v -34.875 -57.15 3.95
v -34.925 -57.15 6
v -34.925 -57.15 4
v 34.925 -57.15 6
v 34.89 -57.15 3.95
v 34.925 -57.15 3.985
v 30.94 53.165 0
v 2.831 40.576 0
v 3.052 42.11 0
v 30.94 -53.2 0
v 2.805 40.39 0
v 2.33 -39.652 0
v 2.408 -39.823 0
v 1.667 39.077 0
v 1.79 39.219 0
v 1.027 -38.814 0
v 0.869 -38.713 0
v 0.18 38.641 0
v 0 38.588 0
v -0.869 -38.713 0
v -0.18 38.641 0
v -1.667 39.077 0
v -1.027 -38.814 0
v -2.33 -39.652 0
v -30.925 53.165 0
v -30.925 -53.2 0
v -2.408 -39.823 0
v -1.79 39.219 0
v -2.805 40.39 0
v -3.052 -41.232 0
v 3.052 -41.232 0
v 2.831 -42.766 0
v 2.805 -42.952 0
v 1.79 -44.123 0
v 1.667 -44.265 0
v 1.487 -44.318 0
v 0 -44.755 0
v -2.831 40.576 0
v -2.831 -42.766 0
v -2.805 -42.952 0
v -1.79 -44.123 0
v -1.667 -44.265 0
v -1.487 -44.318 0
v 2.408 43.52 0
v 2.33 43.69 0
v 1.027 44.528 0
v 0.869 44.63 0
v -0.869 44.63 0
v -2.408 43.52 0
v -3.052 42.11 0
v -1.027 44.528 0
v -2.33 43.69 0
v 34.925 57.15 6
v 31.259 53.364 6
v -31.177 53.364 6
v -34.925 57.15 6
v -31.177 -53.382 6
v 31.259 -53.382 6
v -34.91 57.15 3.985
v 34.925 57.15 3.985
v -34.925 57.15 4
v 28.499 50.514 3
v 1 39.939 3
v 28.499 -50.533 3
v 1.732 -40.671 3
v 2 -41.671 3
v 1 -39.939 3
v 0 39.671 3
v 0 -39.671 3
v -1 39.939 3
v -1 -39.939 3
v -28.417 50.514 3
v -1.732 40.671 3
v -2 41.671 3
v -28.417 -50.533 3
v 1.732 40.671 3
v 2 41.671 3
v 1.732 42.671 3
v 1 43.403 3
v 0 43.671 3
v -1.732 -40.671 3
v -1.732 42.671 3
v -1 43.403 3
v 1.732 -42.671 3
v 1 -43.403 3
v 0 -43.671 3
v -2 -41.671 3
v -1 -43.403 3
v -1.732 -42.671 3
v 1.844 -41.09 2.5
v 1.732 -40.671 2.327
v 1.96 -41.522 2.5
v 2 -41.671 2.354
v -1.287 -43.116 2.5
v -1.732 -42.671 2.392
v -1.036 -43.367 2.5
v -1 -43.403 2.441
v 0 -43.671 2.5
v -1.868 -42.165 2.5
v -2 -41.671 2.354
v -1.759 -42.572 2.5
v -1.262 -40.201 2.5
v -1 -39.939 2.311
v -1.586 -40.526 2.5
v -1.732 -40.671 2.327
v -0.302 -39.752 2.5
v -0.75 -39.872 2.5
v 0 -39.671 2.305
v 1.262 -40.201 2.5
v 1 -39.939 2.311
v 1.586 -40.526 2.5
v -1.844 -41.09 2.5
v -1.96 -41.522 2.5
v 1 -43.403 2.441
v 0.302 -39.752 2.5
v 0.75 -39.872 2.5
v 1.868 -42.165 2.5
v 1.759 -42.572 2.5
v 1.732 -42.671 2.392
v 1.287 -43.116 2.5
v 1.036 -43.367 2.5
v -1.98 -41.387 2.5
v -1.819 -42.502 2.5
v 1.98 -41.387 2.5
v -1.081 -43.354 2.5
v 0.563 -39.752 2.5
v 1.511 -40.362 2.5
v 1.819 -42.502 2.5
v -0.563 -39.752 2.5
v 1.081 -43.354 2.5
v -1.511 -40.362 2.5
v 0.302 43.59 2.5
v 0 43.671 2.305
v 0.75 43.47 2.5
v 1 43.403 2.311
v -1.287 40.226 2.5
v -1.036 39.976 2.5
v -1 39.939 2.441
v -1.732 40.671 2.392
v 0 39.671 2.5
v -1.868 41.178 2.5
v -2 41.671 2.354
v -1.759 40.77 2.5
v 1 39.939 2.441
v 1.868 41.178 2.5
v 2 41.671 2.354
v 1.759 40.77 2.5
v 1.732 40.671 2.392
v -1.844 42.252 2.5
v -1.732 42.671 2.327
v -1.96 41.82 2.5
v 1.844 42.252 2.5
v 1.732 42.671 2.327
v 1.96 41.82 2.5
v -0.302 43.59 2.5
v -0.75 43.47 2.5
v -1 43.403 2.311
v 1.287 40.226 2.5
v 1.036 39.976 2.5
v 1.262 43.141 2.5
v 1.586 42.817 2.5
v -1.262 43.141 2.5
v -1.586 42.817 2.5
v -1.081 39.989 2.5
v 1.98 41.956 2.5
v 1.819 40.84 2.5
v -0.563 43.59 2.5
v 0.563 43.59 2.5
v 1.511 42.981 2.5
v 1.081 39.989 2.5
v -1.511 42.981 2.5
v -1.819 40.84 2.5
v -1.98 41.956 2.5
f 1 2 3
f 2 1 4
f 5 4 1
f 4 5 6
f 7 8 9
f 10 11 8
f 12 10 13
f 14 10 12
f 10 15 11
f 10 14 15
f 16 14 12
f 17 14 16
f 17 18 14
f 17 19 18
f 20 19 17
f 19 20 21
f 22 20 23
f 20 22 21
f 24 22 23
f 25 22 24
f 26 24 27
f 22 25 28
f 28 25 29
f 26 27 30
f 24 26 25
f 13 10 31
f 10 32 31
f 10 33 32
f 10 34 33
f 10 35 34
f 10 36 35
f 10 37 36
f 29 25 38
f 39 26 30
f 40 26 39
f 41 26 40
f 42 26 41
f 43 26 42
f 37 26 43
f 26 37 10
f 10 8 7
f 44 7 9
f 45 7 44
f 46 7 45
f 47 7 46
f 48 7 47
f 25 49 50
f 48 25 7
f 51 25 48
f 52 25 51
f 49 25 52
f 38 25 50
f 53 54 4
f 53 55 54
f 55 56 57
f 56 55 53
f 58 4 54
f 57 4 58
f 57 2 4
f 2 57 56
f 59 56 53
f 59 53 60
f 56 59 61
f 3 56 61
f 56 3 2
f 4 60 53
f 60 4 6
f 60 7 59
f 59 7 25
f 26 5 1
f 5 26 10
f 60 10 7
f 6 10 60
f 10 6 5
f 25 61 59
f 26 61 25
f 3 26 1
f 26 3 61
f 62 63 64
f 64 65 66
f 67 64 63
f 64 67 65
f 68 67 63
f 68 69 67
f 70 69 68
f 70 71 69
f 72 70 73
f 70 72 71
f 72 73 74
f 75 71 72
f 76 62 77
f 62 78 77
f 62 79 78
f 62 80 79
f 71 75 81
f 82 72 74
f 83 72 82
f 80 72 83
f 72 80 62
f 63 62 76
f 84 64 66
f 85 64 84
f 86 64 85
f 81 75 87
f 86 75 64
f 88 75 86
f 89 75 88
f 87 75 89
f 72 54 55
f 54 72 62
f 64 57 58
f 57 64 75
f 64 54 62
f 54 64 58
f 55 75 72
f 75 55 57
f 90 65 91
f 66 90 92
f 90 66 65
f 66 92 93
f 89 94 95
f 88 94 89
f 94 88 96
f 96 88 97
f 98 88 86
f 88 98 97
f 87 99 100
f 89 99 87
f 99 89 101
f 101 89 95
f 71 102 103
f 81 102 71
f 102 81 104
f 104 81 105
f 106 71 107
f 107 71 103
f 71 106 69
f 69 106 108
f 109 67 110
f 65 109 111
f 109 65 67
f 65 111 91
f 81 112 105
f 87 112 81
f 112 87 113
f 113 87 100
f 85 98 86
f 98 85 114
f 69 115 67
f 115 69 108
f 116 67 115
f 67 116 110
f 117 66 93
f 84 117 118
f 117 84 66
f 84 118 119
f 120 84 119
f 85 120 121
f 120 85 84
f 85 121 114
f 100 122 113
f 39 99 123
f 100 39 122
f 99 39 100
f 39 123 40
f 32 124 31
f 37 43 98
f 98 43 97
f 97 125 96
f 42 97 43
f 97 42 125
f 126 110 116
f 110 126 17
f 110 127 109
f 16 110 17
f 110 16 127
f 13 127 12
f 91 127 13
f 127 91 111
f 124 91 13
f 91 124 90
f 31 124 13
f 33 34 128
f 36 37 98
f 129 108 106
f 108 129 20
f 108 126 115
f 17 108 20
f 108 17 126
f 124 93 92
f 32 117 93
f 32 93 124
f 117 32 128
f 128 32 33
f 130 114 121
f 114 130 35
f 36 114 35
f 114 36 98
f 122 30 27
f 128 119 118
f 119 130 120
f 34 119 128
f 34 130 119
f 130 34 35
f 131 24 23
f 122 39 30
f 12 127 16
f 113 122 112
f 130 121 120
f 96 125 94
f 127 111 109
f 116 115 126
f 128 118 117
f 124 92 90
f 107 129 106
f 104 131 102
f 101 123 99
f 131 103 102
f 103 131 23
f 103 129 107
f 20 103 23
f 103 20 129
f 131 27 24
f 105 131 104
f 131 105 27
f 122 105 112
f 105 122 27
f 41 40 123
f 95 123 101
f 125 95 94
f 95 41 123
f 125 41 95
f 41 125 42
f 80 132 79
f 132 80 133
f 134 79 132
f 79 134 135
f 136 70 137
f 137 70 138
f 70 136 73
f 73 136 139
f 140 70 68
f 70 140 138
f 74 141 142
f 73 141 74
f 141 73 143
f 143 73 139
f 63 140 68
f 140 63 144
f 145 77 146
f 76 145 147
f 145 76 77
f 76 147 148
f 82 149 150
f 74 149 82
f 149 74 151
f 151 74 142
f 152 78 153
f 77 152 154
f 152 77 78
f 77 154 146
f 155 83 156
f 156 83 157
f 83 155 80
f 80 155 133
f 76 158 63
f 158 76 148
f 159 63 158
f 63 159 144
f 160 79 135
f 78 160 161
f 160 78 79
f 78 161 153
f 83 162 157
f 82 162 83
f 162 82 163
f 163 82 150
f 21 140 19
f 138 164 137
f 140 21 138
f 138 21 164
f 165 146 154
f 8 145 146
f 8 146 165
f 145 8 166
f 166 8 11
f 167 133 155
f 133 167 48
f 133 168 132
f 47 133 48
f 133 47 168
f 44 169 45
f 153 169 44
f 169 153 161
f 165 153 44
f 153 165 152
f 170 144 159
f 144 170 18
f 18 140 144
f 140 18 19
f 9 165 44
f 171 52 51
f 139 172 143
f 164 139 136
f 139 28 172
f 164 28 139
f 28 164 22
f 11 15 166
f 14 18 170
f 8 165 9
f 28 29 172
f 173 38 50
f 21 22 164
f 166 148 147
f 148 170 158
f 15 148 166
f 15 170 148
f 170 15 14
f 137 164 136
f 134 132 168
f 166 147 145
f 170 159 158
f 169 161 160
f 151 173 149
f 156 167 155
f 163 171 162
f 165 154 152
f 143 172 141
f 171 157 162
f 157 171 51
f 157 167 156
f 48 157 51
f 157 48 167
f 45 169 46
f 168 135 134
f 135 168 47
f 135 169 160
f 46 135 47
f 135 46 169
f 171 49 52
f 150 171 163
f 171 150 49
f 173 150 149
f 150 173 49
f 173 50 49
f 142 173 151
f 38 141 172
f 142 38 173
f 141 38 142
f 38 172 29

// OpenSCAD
// WALLY - Wall Plate Customizer v1.3
// by TheNewHobbyist 2013 (http://thenewhobbyist.com)
// http://www.thingiverse.com/thing:47956
//
// Most of the connectors used with this thing are panel mount connectors from
// www.DataPro.net I can't vouch for their quality but they did have easy to
// find dimensions for their products so I used them.
//
// This could be tightened up considerably but I thought I'd get it out there for people
// to experiment with before I lose my mind staring at it too long. Also this is my
// first OpenSCAD model so cut me some slack ;)
//
//   Notes:
//
// * The plug types "Duplex Outlet", "Long_Toggle Switch", "Toggle Switch", and "Rocker"
//   will all use the entire plate when selected in top or bottom configuration. The
//   other selection (if not "none" will be selected.
//
// * "None" and "Blank should not be considered equal. if "None" is selected for one of
//   the two holes on a plate the other selection will be centered on that plate. If
//   "Blank" is selected that plug location will remain blank but the other selection
//   will NOT move into a centered position.
//
//	Change Log:
//
//	v1.1
//	UPDATED: Screw hole locations for designer and toggle plate types.
//	UPDATED: Hole size for designer plate type.
//	UPDATED: Outlet hole spacing
//
//	v1.2
//	ADDED: Long Toggle Switch for laird
//
//	v1.3
//	ADDED: 3 new sizes for plate export: Standard, Junior-Jumbo, and Jumbo.
//

  //////////////////////////
 // Customizer Settings: //
//////////////////////////

//How big are we talkin' here?
plate_width = 1; //	[1:5]

// Bigger hole in your wall? Try this
plate_size = 0; // [0:Standard, 1:Junior-Jumbo, 2:Jumbo]

//Pick a plug or full plate type
1st_plate = "none";  //	["none":None, "blank":Blank Port, "toggle":Full Plate - Toggle Switch, "long_toggle":Full Plate - Long Toggle Switch, "outlet":Full Plate - Duplex Outlet, "rocker":Full Plate - Rocker/Designer Plate, "keystone1":Keystone Jack, "vga":VGA Port, "hdmi":HDMI Port, "dvi":DVI-I Port, "displayport":Displayport, "cat5e":Cat5e/Cat6 Port, "usb-a":USB-A Port, "usb-b":USB-B Port, "firewire":Firewire IEEE 1394 Port, "db09":DB-09 Port, "ps2":PS2 Port, "f-type": F-Type/Coaxial Port,"svideo":S-Video Port, "stereo":Stereo Headphone Jack]
//Pick a bottom plug type or leave as none
1st_plate_bottom_hole = "none";  //	["none":None, "blank":Blank Port, "keystone1":Keystone Jack, "vga":VGA Port, "hdmi":HDMI Port, "dvi":DVI-I Port, "displayport":Displayport, "cat5e":Cat5e/Cat6 Port, "usb-a":USB-A Port, "usb-b":USB-B Port, "firewire":Firewire IEEE 1394 Port, "db09":DB-09 Port, "ps2":PS2 Port, "f-type": F-Type/Coaxial Port,"svideo":S-Video Port, "stereo":Stereo Headphone Jack]
//Pick a plug or full plate type
2nd_plate = "none";  //	["none":None, "blank":Blank Port, "toggle":Full Plate - Toggle Switch, "long_toggle":Full Plate - Long Toggle Switch, "outlet":Full Plate - Duplex Outlet, "rocker":Full Plate - Rocker/Designer Plate, "keystone1":Keystone Jack, "vga":VGA Port, "hdmi":HDMI Port, "dvi":DVI-I Port, "displayport":Displayport, "cat5e":Cat5e/Cat6 Port, "usb-a":USB-A Port, "usb-b":USB-B Port, "firewire":Firewire IEEE 1394 Port, "db09":DB-09 Port, "ps2":PS2 Port, "f-type": F-Type/Coaxial Port,"svideo":S-Video Port, "stereo":Stereo Headphone Jack]
//Pick a bottom plug type or leave as none
2nd_plate_bottom_hole = "none";  //	["none":None, "blank":Blank Port, "keystone1":Keystone Jack, "vga":VGA Port, "hdmi":HDMI Port, "dvi":DVI-I Port, "displayport":Displayport, "cat5e":Cat5e/Cat6 Port, "usb-a":USB-A Port, "usb-b":USB-B Port, "firewire":Firewire IEEE 1394 Port, "db09":DB-09 Port, "ps2":PS2 Port, "f-type": F-Type/Coaxial Port,"svideo":S-Video Port, "stereo":Stereo Headphone Jack]
//Pick a plug or full plate type
3rd_plate = "none";  //	["none":None, "blank":Blank Port, "toggle":Full Plate - Toggle Switch, "long_toggle":Full Plate - Long Toggle Switch, "outlet":Full Plate - Duplex Outlet, "rocker":Full Plate - Rocker/Designer Plate, "keystone1":Keystone Jack, "vga":VGA Port, "hdmi":HDMI Port, "dvi":DVI-I Port, "displayport":Displayport, "cat5e":Cat5e/Cat6 Port, "usb-a":USB-A Port, "usb-b":USB-B Port, "firewire":Firewire IEEE 1394 Port, "db09":DB-09 Port, "ps2":PS2 Port, "f-type": F-Type/Coaxial Port,"svideo":S-Video Port, "stereo":Stereo Headphone Jack]
//Pick a bottom plug type or leave as none
3rd_plate_bottom_hole = "none";  //	["none":None, "blank":Blank Port, "keystone1":Keystone Jack, "vga":VGA Port, "hdmi":HDMI Port, "dvi":DVI-I Port, "displayport":Displayport, "cat5e":Cat5e/Cat6 Port, "usb-a":USB-A Port, "usb-b":USB-B Port, "firewire":Firewire IEEE 1394 Port, "db09":DB-09 Port, "ps2":PS2 Port, "f-type": F-Type/Coaxial Port,"svideo":S-Video Port, "stereo":Stereo Headphone Jack]
//Pick a plug or full plate type
4th_plate = "none";  //["none":None, "blank":Blank Port, "toggle":Full Plate - Toggle Switch, "long_toggle":Full Plate - Long Toggle Switch, "outlet":Full Plate - Duplex Outlet, "rocker":Full Plate - Rocker/Designer Plate, "keystone1":Keystone Jack, "vga":VGA Port, "hdmi":HDMI Port, "dvi":DVI-I Port, "displayport":Displayport, "cat5e":Cat5e/Cat6 Port, "usb-a":USB-A Port, "usb-b":USB-B Port, "firewire":Firewire IEEE 1394 Port, "db09":DB-09 Port, "ps2":PS2 Port, "f-type": F-Type/Coaxial Port,"svideo":S-Video Port, "stereo":Stereo Headphone Jack]
//Pick a bottom plug type or leave as none
4th_plate_bottom_hole = "none";  //	["none":None, "blank":Blank Port, "keystone1":Keystone Jack, "vga":VGA Port, "hdmi":HDMI Port, "dvi":DVI-I Port, "displayport":Displayport, "cat5e":Cat5e/Cat6 Port, "usb-a":USB-A Port, "usb-b":USB-B Port, "firewire":Firewire IEEE 1394 Port, "db09":DB-09 Port, "ps2":PS2 Port, "f-type": F-Type/Coaxial Port,"svideo":S-Video Port, "stereo":Stereo Headphone Jack]
//Pick a plug or full plate type
5th_plate = "none";  //["none":None, "blank":Blank Port, "toggle":Full Plate - Toggle Switch, "long_toggle":Full Plate - Long Toggle Switch, "outlet":Full Plate - Duplex Outlet, "rocker":Full Plate - Rocker/Designer Plate, "keystone1":Keystone Jack, "vga":VGA Port, "hdmi":HDMI Port, "dvi":DVI-I Port, "displayport":Displayport, "cat5e":Cat5e/Cat6 Port, "usb-a":USB-A Port, "usb-b":USB-B Port, "firewire":Firewire IEEE 1394 Port, "db09":DB-09 Port, "ps2":PS2 Port, "f-type": F-Type/Coaxial Port,"svideo":S-Video Port, "stereo":Stereo Headphone Jack]
//Pick a bottom plug type or leave as none
5th_plate_bottom_hole = "none";  //	["none":None, "blank":Blank Port, "keystone1":Keystone Jack, "vga":VGA Port, "hdmi":HDMI Port, "dvi":DVI-I Port, "displayport":Displayport, "cat5e":Cat5e/Cat6 Port, "usb-a":USB-A Port, "usb-b":USB-B Port, "firewire":Firewire IEEE 1394 Port, "db09":DB-09 Port, "ps2":PS2 Port, "f-type": F-Type/Coaxial Port,"svideo":S-Video Port, "stereo":Stereo Headphone Jack]

  //////////////////////
 // Static Settings: //
//////////////////////

module GoAwayCustomizer() {
// This module is here to stop Customizer from picking up the variables below
}

l_offset = [34.925,39.6875,44.45];
r_offset = [34.925,39.6875,44.45];
spacer = [0,0,46.0375,92.075,138.1125,184.15];
solid_plate_width = l_offset[plate_size] + spacer[plate_width] + r_offset[plate_size];

height_sizes = [114.3,123.825,133.35];

height = 114.3; //plate height (static)
gang_width=[0,69.86,115.824,161.925,206.375,254]; // Plate widths (standard)

edgewidth = solid_plate_width + 10; // Bevel setting for top and bottom
rightbevel = solid_plate_width - 4; // Bevel for right side (scales)

left_offset = 34.925; // Offset first hole position
switch_offset = 46.0375; // Offset all additional holes
thinner_offset=[0,0.92,0.95,0.96,0.97,0.973]; // Manual fix for right side wackiness

positions=[height_sizes[plate_size]/2,height_sizes[plate_size]/2 - 14.25,height_sizes[plate_size]/2 + 14.25];

// preview[view:north, tilt:bottom]

  ///////////////////
 // Hole Control: //
///////////////////

module plate1(){
	if (1st_plate == "toggle" || 1st_plate_bottom_hole == "toggle"){
		translate([0,l_offset[plate_size],0]) toggle_screws();
		translate([0,l_offset[plate_size],0]) hole("toggle");
		}
	else if (1st_plate == "long_toggle" || 1st_plate_bottom_hole == "long_toggle"){
		translate([0,l_offset[plate_size],0]) toggle_screws();
		translate([0,l_offset[plate_size],0]) hole("long_toggle");
		}
	else if (1st_plate == "rocker" || 1st_plate_bottom_hole == "rocker"){
		translate([0,l_offset[plate_size],0]) rocker_screws();
		translate([0,l_offset[plate_size],0]) hole("rocker");
		}
	else if (1st_plate == "outlet" || 1st_plate_bottom_hole == "outlet") {
	translate([0,l_offset[plate_size],0]) hole("outlet");
	}
	else if (1st_plate_bottom_hole == "none") {
		translate([0,l_offset[plate_size],0]) box_screws();
		translate([positions[0],l_offset[plate_size],0]) hole(1st_plate);
			}
	else if (1st_plate == "none") {
		translate([0,l_offset[plate_size],0]) box_screws();
		translate([positions[0],l_offset[plate_size],0]) hole(1st_plate_bottom_hole);
			}
	else {
	translate([0,l_offset[plate_size],0]) box_screws();
	translate([positions[1],l_offset[plate_size],0]) hole(1st_plate);
	translate([positions[2],l_offset[plate_size],0]) hole(1st_plate_bottom_hole);
	}
}

module plate2(){
	if (2nd_plate == "toggle" || 2nd_plate_bottom_hole == "toggle"){
		translate([0,l_offset[plate_size] + switch_offset,0]) toggle_screws();
		translate([0,l_offset[plate_size] + switch_offset,0]) hole("toggle");
		}
	else if (2nd_plate == "long_toggle" || 2nd_plate_bottom_hole == "long_toggle"){
		translate([0,l_offset[plate_size] + switch_offset,0]) toggle_screws();
		translate([0,l_offset[plate_size] + switch_offset,0]) hole("long_toggle");
		}
	else if (2nd_plate == "rocker" || 2nd_plate_bottom_hole == "rocker"){
		translate([0,l_offset[plate_size] + switch_offset,0]) rocker_screws();
		translate([0,l_offset[plate_size] + switch_offset,0]) hole("rocker");
		}
	else if (2nd_plate == "outlet" || 2nd_plate_bottom_hole == "outlet") {
	translate([0,l_offset[plate_size] + switch_offset,0]) hole("outlet");
	}
	else if (2nd_plate_bottom_hole == "none") {
		translate([0,l_offset[plate_size] + switch_offset,0]) box_screws();
		translate([positions[0],l_offset[plate_size] + switch_offset,0]) hole(2nd_plate);
			}
	else if (2nd_plate == "none") {
		translate([0,l_offset[plate_size] + switch_offset,0]) box_screws();
		translate([positions[0],l_offset[plate_size] + switch_offset,0]) hole(2nd_plate_bottom_hole);
			}
	else {
	translate([0,l_offset[plate_size] + switch_offset,0]) box_screws();
	translate([positions[1],l_offset[plate_size] + switch_offset,0]) hole(2nd_plate);
	translate([positions[2],l_offset[plate_size] + switch_offset,0]) hole(2nd_plate_bottom_hole);
	}
}

module plate3(){
	if (3rd_plate == "toggle" || 3rd_plate_bottom_hole == "toggle"){
		translate([0,l_offset[plate_size] + switch_offset * 2,0]) toggle_screws();
		translate([0,l_offset[plate_size] + switch_offset * 2,0]) hole("toggle");
		}
	else if (3rd_plate == "long_toggle" || 3rd_plate_bottom_hole == "long_toggle"){
		translate([0,l_offset[plate_size] + switch_offset * 2,0]) toggle_screws();
		translate([0,l_offset[plate_size] + switch_offset * 2,0]) hole("long_toggle");
		}
	else if (3rd_plate == "rocker" || 3rd_plate_bottom_hole == "rocker"){
		translate([0,l_offset[plate_size] + switch_offset * 2,0]) rocker_screws();
		translate([0,l_offset[plate_size] + switch_offset * 2,0]) hole("rocker");
		}
	else if (3rd_plate == "outlet" || 3rd_plate_bottom_hole == "outlet") {
	translate([0,l_offset[plate_size] + switch_offset * 2,0]) hole("outlet");
	}
	else if (3rd_plate_bottom_hole == "none") {
		translate([0,l_offset[plate_size] + switch_offset * 2,0]) box_screws();
		translate([positions[0],l_offset[plate_size] + switch_offset * 2,0]) hole(3rd_plate);
			}
	else if (3rd_plate == "none") {
		translate([0,l_offset[plate_size] + switch_offset * 2,0]) box_screws();
		translate([positions[0],l_offset[plate_size] + switch_offset * 2,0]) hole(3rd_plate_bottom_hole);
			}
	else {
	translate([0,l_offset[plate_size] + switch_offset * 2,0]) box_screws();
	translate([positions[1],l_offset[plate_size] + switch_offset * 2,0]) hole(3rd_plate);
	translate([positions[2],l_offset[plate_size] + switch_offset * 2,0]) hole(3rd_plate_bottom_hole);
	}
}

module plate4(){
	if (4th_plate == "toggle" || 4th_plate_bottom_hole == "toggle"){
		translate([0,l_offset[plate_size] + switch_offset * 3,0]) toggle_screws();
		translate([0,l_offset[plate_size] + switch_offset * 3,0]) hole("toggle");
		}
	else if (4th_plate == "long_toggle" || 4th_plate_bottom_hole == "long_toggle"){
		translate([0,l_offset[plate_size] + switch_offset * 3,0]) toggle_screws();
		translate([0,l_offset[plate_size] + switch_offset * 3,0]) hole("long_toggle");
		}
	else if (4th_plate == "rocker" || 4th_plate_bottom_hole == "rocker"){
		translate([0,l_offset[plate_size] + switch_offset * 3,0]) rocker_screws();
		translate([0,l_offset[plate_size] + switch_offset * 3,0]) hole("rocker");
		}
	else if (4th_plate == "outlet" || 4th_plate_bottom_hole == "outlet") {
	translate([0,l_offset[plate_size] + switch_offset * 3,0]) hole("outlet");
	}
	else if (4th_plate_bottom_hole == "none") {
		translate([0,l_offset[plate_size] + switch_offset * 3,0]) box_screws();
		translate([positions[0],l_offset[plate_size] + switch_offset * 3,0]) hole(4th_plate);
			}
	else if (4th_plate == "none") {
		translate([0,l_offset[plate_size] + switch_offset * 3,0]) box_screws();
		translate([positions[0],l_offset[plate_size] + switch_offset * 3,0]) hole(4th_plate_bottom_hole);
			}
	else {
	translate([0,l_offset[plate_size] + switch_offset * 3,0]) box_screws();
	translate([positions[1],l_offset[plate_size] + switch_offset * 3,0]) hole(4th_plate);
	translate([positions[2],l_offset[plate_size] + switch_offset * 3,0]) hole(4th_plate_bottom_hole);
	}
}

module plate5(){
	if (5th_plate == "toggle" || 5th_plate_bottom_hole == "toggle"){
		translate([0,l_offset[plate_size] + switch_offset * 4,0]) toggle_screws();
		translate([0,l_offset[plate_size] + switch_offset * 4,0]) hole("toggle");
		}
	else if (5th_plate == "long_toggle" || 5th_plate_bottom_hole == "long_toggle"){
		translate([0,l_offset[plate_size] + switch_offset * 4,0]) toggle_screws();
		translate([0,l_offset[plate_size] + switch_offset * 4,0]) hole("long_toggle");
		}
	else if (5th_plate == "rocker" || 5th_plate_bottom_hole == "rocker"){
		translate([0,l_offset[plate_size] + switch_offset * 4,0]) rocker_screws();
		translate([0,l_offset[plate_size] + switch_offset * 4,0]) hole("rocker");
		}
	else if (5th_plate == "outlet" || 5th_plate_bottom_hole == "outlet") {
	translate([0,l_offset[plate_size] + switch_offset * 4,0]) hole("outlet");
	}
	else if (5th_plate_bottom_hole == "none") {
		translate([0,l_offset[plate_size] + switch_offset * 4,0]) box_screws();
		translate([positions[0],l_offset[plate_size] + switch_offset * 4,0]) hole(5th_plate);
			}
	else if (5th_plate == "none") {
		translate([0,l_offset[plate_size] + switch_offset * 4,0]) box_screws();
		translate([positions[0],l_offset[plate_size] + switch_offset * 4,0]) hole(5th_plate_bottom_hole);
			}
	else {
	translate([0,l_offset[plate_size] + switch_offset * 4,0]) box_screws();
	translate([positions[1],l_offset[plate_size] + switch_offset * 4,0]) hole(5th_plate);
	translate([positions[2],l_offset[plate_size] + switch_offset * 4,0]) hole(5th_plate_bottom_hole);
	}
}

  /////////////////
 // SolidWorks: //
/////////////////

module plate1_solid(){
if (1st_plate == "keystone1" && 1st_plate_bottom_hole == "none") {
	translate([height_sizes[plate_size]/2 + 14.3,l_offset[plate_size] - 11.5,-3.9]) hole("keystone_solid");
	}
else if (1st_plate == "keystone1" && 1st_plate_bottom_hole != "outlet" && 1st_plate_bottom_hole != "toggle" && 1st_plate_bottom_hole != "rocker") {
	translate([height_sizes[plate_size]/2,l_offset[plate_size] - 11.5,-3.9]) hole("keystone_solid");
	}
if (1st_plate_bottom_hole == "keystone1" && 1st_plate == "none") {
	translate([height_sizes[plate_size]/2 + 14.3,l_offset[plate_size] - 11.5,-3.9]) hole("keystone_solid");
	}
else if (1st_plate_bottom_hole == "keystone1" && 1st_plate != "outlet" && 1st_plate != "toggle" && 1st_plate != "rocker") {
	translate([height_sizes[plate_size]/2 + 28.5,l_offset[plate_size] - 11.5,-3.9]) hole("keystone_solid");
	}

}

module plate2_solid(){
if (2nd_plate == "keystone1" && 2nd_plate_bottom_hole == "none") {
	translate([height_sizes[plate_size]/2 + 14.3,l_offset[plate_size] - 11.5 + switch_offset,-3.9]) hole("keystone_solid");
	}
else if (2nd_plate == "keystone1" && 2nd_plate_bottom_hole != "outlet" && 2nd_plate_bottom_hole != "toggle" && 2nd_plate_bottom_hole != "rocker") {
	translate([height_sizes[plate_size]/2,l_offset[plate_size] - 11.5 + switch_offset,-3.9]) hole("keystone_solid");
	}
if (2nd_plate_bottom_hole == "keystone1" && 2nd_plate == "none") {
	translate([height_sizes[plate_size]/2 + 14.3,l_offset[plate_size] - 11.5 + switch_offset,-3.9]) hole("keystone_solid");
	}
else if (2nd_plate_bottom_hole == "keystone1" && 2nd_plate != "outlet" && 2nd_plate != "toggle" && 2nd_plate != "rocker") {
	translate([height_sizes[plate_size]/2 + 28.5,l_offset[plate_size] - 11.5 + switch_offset,-3.9]) hole("keystone_solid");
	}

}

module plate3_solid(){
if (3rd_plate == "keystone1" && 3rd_plate_bottom_hole == "none") {
	translate([height_sizes[plate_size]/2 + 14.3,l_offset[plate_size] - 11.5 + switch_offset * 2,-3.9]) hole("keystone_solid");
	}
else if (3rd_plate == "keystone1" && 3rd_plate_bottom_hole != "outlet" && 3rd_plate_bottom_hole != "toggle" && 3rd_plate_bottom_hole != "rocker") {
	translate([height_sizes[plate_size]/2,l_offset[plate_size] - 11.5 + switch_offset * 2,-3.9]) hole("keystone_solid");
	}
if (3rd_plate_bottom_hole == "keystone1" && 3rd_plate == "none") {
	translate([height_sizes[plate_size]/2 + 14.3,l_offset[plate_size] - 11.5 + switch_offset * 2,-3.9]) hole("keystone_solid");
	}
else if (3rd_plate_bottom_hole == "keystone1" && 3rd_plate != "outlet" && 3rd_plate != "toggle" && 3rd_plate != "rocker") {
	translate([height_sizes[plate_size]/2 + 28.5,l_offset[plate_size] - 11.5 + switch_offset * 2,-3.9]) hole("keystone_solid");
	}

}

module plate4_solid(){
if (4th_plate == "keystone1" && 4th_plate_bottom_hole == "none") {
	translate([height_sizes[plate_size]/2 + 14.3,l_offset[plate_size] - 11.5 + switch_offset * 3,-3.9]) hole("keystone_solid");
	}
else if (4th_plate == "keystone1" && 4th_plate_bottom_hole != "outlet" && 4th_plate_bottom_hole != "toggle" && 4th_plate_bottom_hole != "rocker") {
	translate([height_sizes[plate_size]/2,l_offset[plate_size] - 11.5 + switch_offset * 3,-3.9]) hole("keystone_solid");
	}
if (4th_plate_bottom_hole == "keystone1" && 4th_plate == "none") {
	translate([height_sizes[plate_size]/2 + 14.3,l_offset[plate_size] - 11.5 + switch_offset * 3,-3.9]) hole("keystone_solid");
	}
else if (4th_plate_bottom_hole == "keystone1" && 4th_plate != "outlet" && 4th_plate != "toggle" && 4th_plate != "rocker") {
	translate([height_sizes[plate_size]/2 + 28.5,l_offset[plate_size] - 11.5 + switch_offset * 3,-3.9]) hole("keystone_solid");
	}

}

module plate5_solid(){
if (5th_plate == "keystone1" && 5th_plate_bottom_hole == "none") {
	translate([height_sizes[plate_size]/2 + 14.3,l_offset[plate_size] - 11.5 + switch_offset * 4,-3.9]) hole("keystone_solid");
	}
else if (5th_plate == "keystone1" && 5th_plate_bottom_hole != "outlet" && 5th_plate_bottom_hole != "toggle" && 5th_plate_bottom_hole != "rocker") {
	translate([height_sizes[plate_size]/2,l_offset[plate_size] - 11.5 + switch_offset * 4,-3.9]) hole("keystone_solid");
	}
if (5th_plate_bottom_hole == "keystone1" && 5th_plate == "none") {
	translate([height_sizes[plate_size]/2 + 14.3,l_offset[plate_size] - 11.5 + switch_offset * 4,-3.9]) hole("keystone_solid");
	}
else if (5th_plate_bottom_hole == "keystone1" && 5th_plate != "outlet" && 5th_plate != "toggle" && 5th_plate != "rocker") {
	translate([height_sizes[plate_size]/2 + 28.5,l_offset[plate_size] - 11.5 + switch_offset * 4,-3.9]) hole("keystone_solid");
	}

}

  ///////////////////
 // PlateStation: //
///////////////////

//Plate size and bevel
module plate() {
	difference() {
		cube([height_sizes[plate_size],solid_plate_width,6]);
		translate([-4.3,-5,6.2]) rotate([0,45,0]) cube([6,edgewidth,6]); //Top Bevel
		translate([height_sizes[plate_size]-4.2,-5,6.25]) rotate([0,45,0]) cube([6,edgewidth,6]); //Bottom Bevel
		translate([height_sizes[plate_size]+10,-4.4,6.1]) rotate([0,45,90]) cube([6,height_sizes[plate_size]+20,6]); //Left Bevel (doesn't change)
		translate([height_sizes[plate_size]+10,rightbevel,6]) rotate([0,45,90]) cube([6,height_sizes[plate_size]+10,6]); //Right Bevel (scales right)
				}
			}


// Thinning Plate
module plate_inner() {
	scale([0.95,thinner_offset[plate_width],1]){
	translate([3,3,0]){
	difference() {
		cube([height_sizes[plate_size],solid_plate_width,6]);
		translate([-4.3,-5,6.2]) rotate([0,45,0]) cube([6,edgewidth,6]); //Top Bevel
		translate([height_sizes[plate_size]-4.2,-5,6.25]) rotate([0,45,0]) cube([6,edgewidth,6]); //Bottom Bevel
		translate([height_sizes[plate_size]+10,-4.4,6.1]) rotate([0,45,90]) cube([6,height_sizes[plate_size]+20,6]); //Left Bevel (doesn't change)
		translate([height_sizes[plate_size]+10,rightbevel,6]) rotate([0,45,90]) cube([6,height_sizes[plate_size]+10,6]); //Right Bevel (scales right)
				}
			}
		}
	}

// Box screw holes
module box_screws(){
	 translate([height_sizes[plate_size]/2 + 41.67125,0,-1]) cylinder(r=2, h=10, $fn=12);
	 translate([height_sizes[plate_size]/2 + 41.67125,0,3.5]) cylinder(r1=2, r2=3.3, h=3);
	 translate([height_sizes[plate_size]/2 - 41.67125,0,-1]) cylinder(r=2, h=10, $fn=12);
	 translate([height_sizes[plate_size]/2 - 41.67125,0,3.5]) cylinder(r1=2, r2=3.3, h=3);
}

// Rocker/Designer screw holes
module rocker_screws(){
	 translate([height_sizes[plate_size]/2 + 48.41875,0,-1]) cylinder(r=2, h=10, $fn=12);
	 translate([height_sizes[plate_size]/2 + 48.41875,0,3.5]) cylinder(r1=2, r2=3.3, h=3);
	 translate([height_sizes[plate_size]/2 - 48.41875,0,-1]) cylinder(r=2, h=10, $fn=12);
	 translate([height_sizes[plate_size]/2 - 48.41875,0,3.5]) cylinder(r1=2, r2=3.3, h=3);
}

// Toggle screw holes
module toggle_screws(){
	 translate([height_sizes[plate_size]/2 + 30.1625,0,-1]) cylinder(r=2, h=10, $fn=12);
	 translate([height_sizes[plate_size]/2 + 30.1625,0,3.5]) cylinder(r1=2, r2=3.3, h=3);
	 translate([height_sizes[plate_size]/2 - 30.1625,0,-1]) cylinder(r=2, h=10, $fn=12);
	 translate([height_sizes[plate_size]/2 - 30.1625,0,3.5]) cylinder(r1=2, r2=3.3, h=3);
}

  ///////////////
 // Portland: //
///////////////

// Hole Cutout definitions
module hole(hole_type) {


// Toggle switch hole
	if (hole_type == "toggle") {
		translate([height_sizes[plate_size]/2,0,0]) cube([23.8125,10.3188,15], center = true);
		 						}

// Toggle switch hole and screw holes
	if (hole_type == "long_toggle") {
		translate([height_sizes[plate_size]/2,0,0]) cube([43.6563,11.9063,15], center = true);
		 						}

// Rocker switch plate
	if (hole_type == "rocker") {
		translate([height_sizes[plate_size]/2,0,0]) cube([67.1,33.3,15], center = true);

		 						}

// Duplex power outlet plate or dual side toggles
	if (hole_type == "outlet" || hole_type == "dualsidetoggle") {
		translate([height_sizes[plate_size]/2 + 19.3915,0,0]) {
			difference() {
				cylinder(r=17.4625, h=15, center = true);
				translate([-24.2875,-15,-2]) cube([10,37,15], center = false);
				translate([14.2875,-15,-2]) cube([10,37,15], center = false);
								}
							}
		translate([height_sizes[plate_size]/2 - 19.3915,0,0]){
			difference(){
				cylinder(r=17.4625, h=15, center = true);
				translate([-24.2875,-15,-2]) cube([10,37,15], center = false);
				translate([14.2875,-15,-2]) cube([10,37,15], center = false);
								}
							}
		translate([height_sizes[plate_size]/2,0,-1]) cylinder(r=2, h=10);
		translate([height_sizes[plate_size]/2,0,3.5]) cylinder(r1=2, r2=3.3, h=3);
							}

// Blank plate
	if (hole_type == "blank") { }

// VGA & DB09 plate
// VGA Fits http://www.datapro.net/products/vga-dual-panel-mount-f-f-cable.html
// DB09 Fits http://www.datapro.net/products/db9-serial-panel-mount-male-extension.html
	if (hole_type == "vga" || hole_type == "db09") {

			translate([0,-12.5,3]) cylinder(r=1.75, h=10, center = true);
			translate([0,12.5,3]) cylinder(r=1.75, h=10, center = true);
				difference(){
					cube([10,19,13], center=true);
					translate([-5,-9.2,1]) rotate([0,0,-35.6]) cube([4.4,2.4,15], center=true);
					translate([.9,-11.2,0]) rotate([0,0,9.6]) cube([10,4.8,15], center=true);
					translate([4.6,-8.5,0]) rotate([0,0,37.2]) cube([4.4,2.4,15], center=true);
					translate([-5,9.2,1]) rotate([0,0,35.6]) cube([4.4,2.4,15], center=true);
					translate([0.9,11.2,0]) rotate([0,0,-9.6]) cube([10,4.8,15], center=true);
					translate([4.6,8.5,0]) rotate([0,0,-37.2]) cube([4.4,2.4,15], center=true);
								}
						}

// HDMI plate
// Fits http://www.datapro.net/products/hdmi-panel-mount-extension-cable.html
	if (hole_type == "hdmi") {
		translate([0,-13,3]) cylinder(r=1.75, h=10, center = true);
		translate([0,13,3]) cylinder(r=1.75, h=10, center = true);
		translate([0,0,3]) cube([6,16,10], center=true);
							}

// DVI-I plate
// Fits http://www.datapro.net/products/dvi-i-panel-mount-extension-cable.html
	if (hole_type == "dvi") {
		translate([0,-16,3]) cylinder(r=1.75, h=10, center = true);
		translate([0,16,3]) cylinder(r=1.75, h=10, center = true);
		translate([0,0,3]) cube([10,26,10], center=true);
							}

// DisplayPort plate
// Fits http://www.datapro.net/products/dvi-i-panel-mount-extension-cable.html
	if (hole_type == "displayport") {
		translate([0,-13.5,3]) cylinder(r=1.75, h=10, center = true);
		translate([0,13.5,3]) cylinder(r=1.75, h=10, center = true);
		translate([0,0,0]){
			difference(){
				translate([0,0,3]) cube([7,19,10], center=true);
				translate([2.47,-9.37,3]) rotate([0,0,-54.6]) cube([3,5,14], center=true);
						}
								}
									}

// USB-A Plate
// Fits http://www.datapro.net/products/usb-panel-mount-type-a-cable.html
	if (hole_type == "usb-a") {
		translate([0,-15,3]) cylinder(r=1.75, h=10, center = true);
		translate([0,15,3]) cylinder(r=1.75, h=10, center = true);
		translate([0,0,3]) cube([8,16,10], center=true);
							}

// USB-B Plate
// Fits http://www.datapro.net/products/usb-panel-mount-type-b-cable.html
	if (hole_type == "usb-b") {
		translate([0,-13,3]) cylinder(r=1.75, h=10, center = true);
		translate([0,13,3]) cylinder(r=1.75, h=10, center = true);
		translate([0,0,3]) cube([11,12,10], center=true);
							}

// 1394 Firewire Plate
// Fits http://www.datapro.net/products/firewire-panel-mount-extension.html
	if (hole_type == "firewire") {
		translate([0,-13.5,3]) cylinder(r=1.75, h=10, center = true);
		translate([0,13.5,3]) cylinder(r=1.75, h=10, center = true);
		translate([0,0,3]) cube([7,12,10], center=true);
							}

// F-Type / Cable TV Plate
// Fits http://www.datapro.net/products/f-type-panel-mounting-coupler.html
	if (hole_type == "f-type") {
		translate([0,0,3]) cylinder(r=4.7625, h=10, center=true);
							}

// Cat5e & Gat6 plate
// Cat5e Fits http://www.datapro.net/products/cat-5e-panel-mount-ethernet.html
// Cat6 Fits hhttp://www.datapro.net/products/cat-6-panel-mount-ethernet.html
	if (hole_type == "cat5e" || hole_type == "cat6") {
		translate([0,-12.5,3]) cylinder(r=1.75, h=10, center = true);
		translate([0,12.5,3]) cylinder(r=1.75, h=10, center = true);
		translate([0,0,3]) cube([15,15,10], center=true);
		}

// S-Video & PS2 plate
// S-Video Fits hhttp://www.datapro.net/products/cat-6-panel-mount-ethernet.html
// PS2 http://www.datapro.net/products/ps2-panel-mount-extension-cable.html
	if (hole_type == "svideo" || hole_type == "ps2") {
		translate([0,-10,3]) cylinder(r=1.75, h=10, center = true);
		translate([0,10,3]) cylinder(r=1.75, h=10, center = true);
		translate([0,0,3]) cylinder(r=5, h=10, center=true);
		}


// Stereo / 1/4" headphone jack coupler
// Stereo coupler Fits http://www.datapro.net/products/stereo-panel-mount-coupler.html
	if (hole_type == "stereo") {
		translate([0,0,3]) cylinder(r=2.985, h=10, center=true);
		}

//Keystone1 hole
//Hole for 1 Keystone Jack
	if (hole_type == "keystone1") {
		translate([0,0,5]) cube([16.5,15,10], center = true);
	}

//Keystone Solid
	if (hole_type == "keystone_solid") {
		rotate([0,0,90]) {
			difference(){
				translate([0,0,.1]) cube([23,30.5,9.8]);
					translate([4,4,0]){
						difference(){
							cube([15,22.5,10]);
							translate([-1,-0.001,3.501]) cube([17,2,6.5]);
							translate([-1,2.5,-3.40970]) rotate([45,0,0]) cube([17,2,6.5]);
							translate([-1,18.501,6.001]) cube([17,4,4]);
							translate([-1,20.5,0]) rotate([-45,0,0]) cube([17,2,6.5]);
						}
					}
				}
			}
		}

//End of module "hole"
}

  ////////////////////////
 // Number One ENGAGE: //
////////////////////////

// Rotate so it sits correctly on plate (whoops) and make upside down
rotate([0,180,90]){
// put plate at 0,0,0 for easier printing
translate([-height_sizes[plate_size]/2,-solid_plate_width/2,-6]){

if (plate_width == 1) {
	difference() {
		plate();
		translate([0,0,-3]) plate_inner();
		plate1();
			}
		union() {
		plate1_solid();
		}
			}

else if (plate_width == 2) {
difference()
{
plate();
translate([0,0,-3]) plate_inner();
plate1();
plate2();
}
union() {
		plate1_solid();
		plate2_solid();
		}
}

else if (plate_width == 3) {
difference()
{
plate();
translate([0,0,-3]) plate_inner();
plate1();
plate2();
plate3();
}
union() {
		plate1_solid();
		plate2_solid();
		plate3_solid();
		}
}

else if (plate_width == 4) {
difference()
{
plate();
translate([0,0,-3]) plate_inner();
plate1();
plate2();
plate3();
plate4();
}
union() {
		plate1_solid();
		plate2_solid();
		plate3_solid();
		plate4_solid();
		}
}

else if (plate_width == 5) {
difference()
{
plate();
translate([0,0,-3]) plate_inner();
plate1();
plate2();
plate3();
plate4();
plate5();
}
union() {
		plate1_solid();
		plate2_solid();
		plate3_solid();
		plate4_solid();
		plate5_solid();
		}
}

//End Rotate
}
//End Translate
}
